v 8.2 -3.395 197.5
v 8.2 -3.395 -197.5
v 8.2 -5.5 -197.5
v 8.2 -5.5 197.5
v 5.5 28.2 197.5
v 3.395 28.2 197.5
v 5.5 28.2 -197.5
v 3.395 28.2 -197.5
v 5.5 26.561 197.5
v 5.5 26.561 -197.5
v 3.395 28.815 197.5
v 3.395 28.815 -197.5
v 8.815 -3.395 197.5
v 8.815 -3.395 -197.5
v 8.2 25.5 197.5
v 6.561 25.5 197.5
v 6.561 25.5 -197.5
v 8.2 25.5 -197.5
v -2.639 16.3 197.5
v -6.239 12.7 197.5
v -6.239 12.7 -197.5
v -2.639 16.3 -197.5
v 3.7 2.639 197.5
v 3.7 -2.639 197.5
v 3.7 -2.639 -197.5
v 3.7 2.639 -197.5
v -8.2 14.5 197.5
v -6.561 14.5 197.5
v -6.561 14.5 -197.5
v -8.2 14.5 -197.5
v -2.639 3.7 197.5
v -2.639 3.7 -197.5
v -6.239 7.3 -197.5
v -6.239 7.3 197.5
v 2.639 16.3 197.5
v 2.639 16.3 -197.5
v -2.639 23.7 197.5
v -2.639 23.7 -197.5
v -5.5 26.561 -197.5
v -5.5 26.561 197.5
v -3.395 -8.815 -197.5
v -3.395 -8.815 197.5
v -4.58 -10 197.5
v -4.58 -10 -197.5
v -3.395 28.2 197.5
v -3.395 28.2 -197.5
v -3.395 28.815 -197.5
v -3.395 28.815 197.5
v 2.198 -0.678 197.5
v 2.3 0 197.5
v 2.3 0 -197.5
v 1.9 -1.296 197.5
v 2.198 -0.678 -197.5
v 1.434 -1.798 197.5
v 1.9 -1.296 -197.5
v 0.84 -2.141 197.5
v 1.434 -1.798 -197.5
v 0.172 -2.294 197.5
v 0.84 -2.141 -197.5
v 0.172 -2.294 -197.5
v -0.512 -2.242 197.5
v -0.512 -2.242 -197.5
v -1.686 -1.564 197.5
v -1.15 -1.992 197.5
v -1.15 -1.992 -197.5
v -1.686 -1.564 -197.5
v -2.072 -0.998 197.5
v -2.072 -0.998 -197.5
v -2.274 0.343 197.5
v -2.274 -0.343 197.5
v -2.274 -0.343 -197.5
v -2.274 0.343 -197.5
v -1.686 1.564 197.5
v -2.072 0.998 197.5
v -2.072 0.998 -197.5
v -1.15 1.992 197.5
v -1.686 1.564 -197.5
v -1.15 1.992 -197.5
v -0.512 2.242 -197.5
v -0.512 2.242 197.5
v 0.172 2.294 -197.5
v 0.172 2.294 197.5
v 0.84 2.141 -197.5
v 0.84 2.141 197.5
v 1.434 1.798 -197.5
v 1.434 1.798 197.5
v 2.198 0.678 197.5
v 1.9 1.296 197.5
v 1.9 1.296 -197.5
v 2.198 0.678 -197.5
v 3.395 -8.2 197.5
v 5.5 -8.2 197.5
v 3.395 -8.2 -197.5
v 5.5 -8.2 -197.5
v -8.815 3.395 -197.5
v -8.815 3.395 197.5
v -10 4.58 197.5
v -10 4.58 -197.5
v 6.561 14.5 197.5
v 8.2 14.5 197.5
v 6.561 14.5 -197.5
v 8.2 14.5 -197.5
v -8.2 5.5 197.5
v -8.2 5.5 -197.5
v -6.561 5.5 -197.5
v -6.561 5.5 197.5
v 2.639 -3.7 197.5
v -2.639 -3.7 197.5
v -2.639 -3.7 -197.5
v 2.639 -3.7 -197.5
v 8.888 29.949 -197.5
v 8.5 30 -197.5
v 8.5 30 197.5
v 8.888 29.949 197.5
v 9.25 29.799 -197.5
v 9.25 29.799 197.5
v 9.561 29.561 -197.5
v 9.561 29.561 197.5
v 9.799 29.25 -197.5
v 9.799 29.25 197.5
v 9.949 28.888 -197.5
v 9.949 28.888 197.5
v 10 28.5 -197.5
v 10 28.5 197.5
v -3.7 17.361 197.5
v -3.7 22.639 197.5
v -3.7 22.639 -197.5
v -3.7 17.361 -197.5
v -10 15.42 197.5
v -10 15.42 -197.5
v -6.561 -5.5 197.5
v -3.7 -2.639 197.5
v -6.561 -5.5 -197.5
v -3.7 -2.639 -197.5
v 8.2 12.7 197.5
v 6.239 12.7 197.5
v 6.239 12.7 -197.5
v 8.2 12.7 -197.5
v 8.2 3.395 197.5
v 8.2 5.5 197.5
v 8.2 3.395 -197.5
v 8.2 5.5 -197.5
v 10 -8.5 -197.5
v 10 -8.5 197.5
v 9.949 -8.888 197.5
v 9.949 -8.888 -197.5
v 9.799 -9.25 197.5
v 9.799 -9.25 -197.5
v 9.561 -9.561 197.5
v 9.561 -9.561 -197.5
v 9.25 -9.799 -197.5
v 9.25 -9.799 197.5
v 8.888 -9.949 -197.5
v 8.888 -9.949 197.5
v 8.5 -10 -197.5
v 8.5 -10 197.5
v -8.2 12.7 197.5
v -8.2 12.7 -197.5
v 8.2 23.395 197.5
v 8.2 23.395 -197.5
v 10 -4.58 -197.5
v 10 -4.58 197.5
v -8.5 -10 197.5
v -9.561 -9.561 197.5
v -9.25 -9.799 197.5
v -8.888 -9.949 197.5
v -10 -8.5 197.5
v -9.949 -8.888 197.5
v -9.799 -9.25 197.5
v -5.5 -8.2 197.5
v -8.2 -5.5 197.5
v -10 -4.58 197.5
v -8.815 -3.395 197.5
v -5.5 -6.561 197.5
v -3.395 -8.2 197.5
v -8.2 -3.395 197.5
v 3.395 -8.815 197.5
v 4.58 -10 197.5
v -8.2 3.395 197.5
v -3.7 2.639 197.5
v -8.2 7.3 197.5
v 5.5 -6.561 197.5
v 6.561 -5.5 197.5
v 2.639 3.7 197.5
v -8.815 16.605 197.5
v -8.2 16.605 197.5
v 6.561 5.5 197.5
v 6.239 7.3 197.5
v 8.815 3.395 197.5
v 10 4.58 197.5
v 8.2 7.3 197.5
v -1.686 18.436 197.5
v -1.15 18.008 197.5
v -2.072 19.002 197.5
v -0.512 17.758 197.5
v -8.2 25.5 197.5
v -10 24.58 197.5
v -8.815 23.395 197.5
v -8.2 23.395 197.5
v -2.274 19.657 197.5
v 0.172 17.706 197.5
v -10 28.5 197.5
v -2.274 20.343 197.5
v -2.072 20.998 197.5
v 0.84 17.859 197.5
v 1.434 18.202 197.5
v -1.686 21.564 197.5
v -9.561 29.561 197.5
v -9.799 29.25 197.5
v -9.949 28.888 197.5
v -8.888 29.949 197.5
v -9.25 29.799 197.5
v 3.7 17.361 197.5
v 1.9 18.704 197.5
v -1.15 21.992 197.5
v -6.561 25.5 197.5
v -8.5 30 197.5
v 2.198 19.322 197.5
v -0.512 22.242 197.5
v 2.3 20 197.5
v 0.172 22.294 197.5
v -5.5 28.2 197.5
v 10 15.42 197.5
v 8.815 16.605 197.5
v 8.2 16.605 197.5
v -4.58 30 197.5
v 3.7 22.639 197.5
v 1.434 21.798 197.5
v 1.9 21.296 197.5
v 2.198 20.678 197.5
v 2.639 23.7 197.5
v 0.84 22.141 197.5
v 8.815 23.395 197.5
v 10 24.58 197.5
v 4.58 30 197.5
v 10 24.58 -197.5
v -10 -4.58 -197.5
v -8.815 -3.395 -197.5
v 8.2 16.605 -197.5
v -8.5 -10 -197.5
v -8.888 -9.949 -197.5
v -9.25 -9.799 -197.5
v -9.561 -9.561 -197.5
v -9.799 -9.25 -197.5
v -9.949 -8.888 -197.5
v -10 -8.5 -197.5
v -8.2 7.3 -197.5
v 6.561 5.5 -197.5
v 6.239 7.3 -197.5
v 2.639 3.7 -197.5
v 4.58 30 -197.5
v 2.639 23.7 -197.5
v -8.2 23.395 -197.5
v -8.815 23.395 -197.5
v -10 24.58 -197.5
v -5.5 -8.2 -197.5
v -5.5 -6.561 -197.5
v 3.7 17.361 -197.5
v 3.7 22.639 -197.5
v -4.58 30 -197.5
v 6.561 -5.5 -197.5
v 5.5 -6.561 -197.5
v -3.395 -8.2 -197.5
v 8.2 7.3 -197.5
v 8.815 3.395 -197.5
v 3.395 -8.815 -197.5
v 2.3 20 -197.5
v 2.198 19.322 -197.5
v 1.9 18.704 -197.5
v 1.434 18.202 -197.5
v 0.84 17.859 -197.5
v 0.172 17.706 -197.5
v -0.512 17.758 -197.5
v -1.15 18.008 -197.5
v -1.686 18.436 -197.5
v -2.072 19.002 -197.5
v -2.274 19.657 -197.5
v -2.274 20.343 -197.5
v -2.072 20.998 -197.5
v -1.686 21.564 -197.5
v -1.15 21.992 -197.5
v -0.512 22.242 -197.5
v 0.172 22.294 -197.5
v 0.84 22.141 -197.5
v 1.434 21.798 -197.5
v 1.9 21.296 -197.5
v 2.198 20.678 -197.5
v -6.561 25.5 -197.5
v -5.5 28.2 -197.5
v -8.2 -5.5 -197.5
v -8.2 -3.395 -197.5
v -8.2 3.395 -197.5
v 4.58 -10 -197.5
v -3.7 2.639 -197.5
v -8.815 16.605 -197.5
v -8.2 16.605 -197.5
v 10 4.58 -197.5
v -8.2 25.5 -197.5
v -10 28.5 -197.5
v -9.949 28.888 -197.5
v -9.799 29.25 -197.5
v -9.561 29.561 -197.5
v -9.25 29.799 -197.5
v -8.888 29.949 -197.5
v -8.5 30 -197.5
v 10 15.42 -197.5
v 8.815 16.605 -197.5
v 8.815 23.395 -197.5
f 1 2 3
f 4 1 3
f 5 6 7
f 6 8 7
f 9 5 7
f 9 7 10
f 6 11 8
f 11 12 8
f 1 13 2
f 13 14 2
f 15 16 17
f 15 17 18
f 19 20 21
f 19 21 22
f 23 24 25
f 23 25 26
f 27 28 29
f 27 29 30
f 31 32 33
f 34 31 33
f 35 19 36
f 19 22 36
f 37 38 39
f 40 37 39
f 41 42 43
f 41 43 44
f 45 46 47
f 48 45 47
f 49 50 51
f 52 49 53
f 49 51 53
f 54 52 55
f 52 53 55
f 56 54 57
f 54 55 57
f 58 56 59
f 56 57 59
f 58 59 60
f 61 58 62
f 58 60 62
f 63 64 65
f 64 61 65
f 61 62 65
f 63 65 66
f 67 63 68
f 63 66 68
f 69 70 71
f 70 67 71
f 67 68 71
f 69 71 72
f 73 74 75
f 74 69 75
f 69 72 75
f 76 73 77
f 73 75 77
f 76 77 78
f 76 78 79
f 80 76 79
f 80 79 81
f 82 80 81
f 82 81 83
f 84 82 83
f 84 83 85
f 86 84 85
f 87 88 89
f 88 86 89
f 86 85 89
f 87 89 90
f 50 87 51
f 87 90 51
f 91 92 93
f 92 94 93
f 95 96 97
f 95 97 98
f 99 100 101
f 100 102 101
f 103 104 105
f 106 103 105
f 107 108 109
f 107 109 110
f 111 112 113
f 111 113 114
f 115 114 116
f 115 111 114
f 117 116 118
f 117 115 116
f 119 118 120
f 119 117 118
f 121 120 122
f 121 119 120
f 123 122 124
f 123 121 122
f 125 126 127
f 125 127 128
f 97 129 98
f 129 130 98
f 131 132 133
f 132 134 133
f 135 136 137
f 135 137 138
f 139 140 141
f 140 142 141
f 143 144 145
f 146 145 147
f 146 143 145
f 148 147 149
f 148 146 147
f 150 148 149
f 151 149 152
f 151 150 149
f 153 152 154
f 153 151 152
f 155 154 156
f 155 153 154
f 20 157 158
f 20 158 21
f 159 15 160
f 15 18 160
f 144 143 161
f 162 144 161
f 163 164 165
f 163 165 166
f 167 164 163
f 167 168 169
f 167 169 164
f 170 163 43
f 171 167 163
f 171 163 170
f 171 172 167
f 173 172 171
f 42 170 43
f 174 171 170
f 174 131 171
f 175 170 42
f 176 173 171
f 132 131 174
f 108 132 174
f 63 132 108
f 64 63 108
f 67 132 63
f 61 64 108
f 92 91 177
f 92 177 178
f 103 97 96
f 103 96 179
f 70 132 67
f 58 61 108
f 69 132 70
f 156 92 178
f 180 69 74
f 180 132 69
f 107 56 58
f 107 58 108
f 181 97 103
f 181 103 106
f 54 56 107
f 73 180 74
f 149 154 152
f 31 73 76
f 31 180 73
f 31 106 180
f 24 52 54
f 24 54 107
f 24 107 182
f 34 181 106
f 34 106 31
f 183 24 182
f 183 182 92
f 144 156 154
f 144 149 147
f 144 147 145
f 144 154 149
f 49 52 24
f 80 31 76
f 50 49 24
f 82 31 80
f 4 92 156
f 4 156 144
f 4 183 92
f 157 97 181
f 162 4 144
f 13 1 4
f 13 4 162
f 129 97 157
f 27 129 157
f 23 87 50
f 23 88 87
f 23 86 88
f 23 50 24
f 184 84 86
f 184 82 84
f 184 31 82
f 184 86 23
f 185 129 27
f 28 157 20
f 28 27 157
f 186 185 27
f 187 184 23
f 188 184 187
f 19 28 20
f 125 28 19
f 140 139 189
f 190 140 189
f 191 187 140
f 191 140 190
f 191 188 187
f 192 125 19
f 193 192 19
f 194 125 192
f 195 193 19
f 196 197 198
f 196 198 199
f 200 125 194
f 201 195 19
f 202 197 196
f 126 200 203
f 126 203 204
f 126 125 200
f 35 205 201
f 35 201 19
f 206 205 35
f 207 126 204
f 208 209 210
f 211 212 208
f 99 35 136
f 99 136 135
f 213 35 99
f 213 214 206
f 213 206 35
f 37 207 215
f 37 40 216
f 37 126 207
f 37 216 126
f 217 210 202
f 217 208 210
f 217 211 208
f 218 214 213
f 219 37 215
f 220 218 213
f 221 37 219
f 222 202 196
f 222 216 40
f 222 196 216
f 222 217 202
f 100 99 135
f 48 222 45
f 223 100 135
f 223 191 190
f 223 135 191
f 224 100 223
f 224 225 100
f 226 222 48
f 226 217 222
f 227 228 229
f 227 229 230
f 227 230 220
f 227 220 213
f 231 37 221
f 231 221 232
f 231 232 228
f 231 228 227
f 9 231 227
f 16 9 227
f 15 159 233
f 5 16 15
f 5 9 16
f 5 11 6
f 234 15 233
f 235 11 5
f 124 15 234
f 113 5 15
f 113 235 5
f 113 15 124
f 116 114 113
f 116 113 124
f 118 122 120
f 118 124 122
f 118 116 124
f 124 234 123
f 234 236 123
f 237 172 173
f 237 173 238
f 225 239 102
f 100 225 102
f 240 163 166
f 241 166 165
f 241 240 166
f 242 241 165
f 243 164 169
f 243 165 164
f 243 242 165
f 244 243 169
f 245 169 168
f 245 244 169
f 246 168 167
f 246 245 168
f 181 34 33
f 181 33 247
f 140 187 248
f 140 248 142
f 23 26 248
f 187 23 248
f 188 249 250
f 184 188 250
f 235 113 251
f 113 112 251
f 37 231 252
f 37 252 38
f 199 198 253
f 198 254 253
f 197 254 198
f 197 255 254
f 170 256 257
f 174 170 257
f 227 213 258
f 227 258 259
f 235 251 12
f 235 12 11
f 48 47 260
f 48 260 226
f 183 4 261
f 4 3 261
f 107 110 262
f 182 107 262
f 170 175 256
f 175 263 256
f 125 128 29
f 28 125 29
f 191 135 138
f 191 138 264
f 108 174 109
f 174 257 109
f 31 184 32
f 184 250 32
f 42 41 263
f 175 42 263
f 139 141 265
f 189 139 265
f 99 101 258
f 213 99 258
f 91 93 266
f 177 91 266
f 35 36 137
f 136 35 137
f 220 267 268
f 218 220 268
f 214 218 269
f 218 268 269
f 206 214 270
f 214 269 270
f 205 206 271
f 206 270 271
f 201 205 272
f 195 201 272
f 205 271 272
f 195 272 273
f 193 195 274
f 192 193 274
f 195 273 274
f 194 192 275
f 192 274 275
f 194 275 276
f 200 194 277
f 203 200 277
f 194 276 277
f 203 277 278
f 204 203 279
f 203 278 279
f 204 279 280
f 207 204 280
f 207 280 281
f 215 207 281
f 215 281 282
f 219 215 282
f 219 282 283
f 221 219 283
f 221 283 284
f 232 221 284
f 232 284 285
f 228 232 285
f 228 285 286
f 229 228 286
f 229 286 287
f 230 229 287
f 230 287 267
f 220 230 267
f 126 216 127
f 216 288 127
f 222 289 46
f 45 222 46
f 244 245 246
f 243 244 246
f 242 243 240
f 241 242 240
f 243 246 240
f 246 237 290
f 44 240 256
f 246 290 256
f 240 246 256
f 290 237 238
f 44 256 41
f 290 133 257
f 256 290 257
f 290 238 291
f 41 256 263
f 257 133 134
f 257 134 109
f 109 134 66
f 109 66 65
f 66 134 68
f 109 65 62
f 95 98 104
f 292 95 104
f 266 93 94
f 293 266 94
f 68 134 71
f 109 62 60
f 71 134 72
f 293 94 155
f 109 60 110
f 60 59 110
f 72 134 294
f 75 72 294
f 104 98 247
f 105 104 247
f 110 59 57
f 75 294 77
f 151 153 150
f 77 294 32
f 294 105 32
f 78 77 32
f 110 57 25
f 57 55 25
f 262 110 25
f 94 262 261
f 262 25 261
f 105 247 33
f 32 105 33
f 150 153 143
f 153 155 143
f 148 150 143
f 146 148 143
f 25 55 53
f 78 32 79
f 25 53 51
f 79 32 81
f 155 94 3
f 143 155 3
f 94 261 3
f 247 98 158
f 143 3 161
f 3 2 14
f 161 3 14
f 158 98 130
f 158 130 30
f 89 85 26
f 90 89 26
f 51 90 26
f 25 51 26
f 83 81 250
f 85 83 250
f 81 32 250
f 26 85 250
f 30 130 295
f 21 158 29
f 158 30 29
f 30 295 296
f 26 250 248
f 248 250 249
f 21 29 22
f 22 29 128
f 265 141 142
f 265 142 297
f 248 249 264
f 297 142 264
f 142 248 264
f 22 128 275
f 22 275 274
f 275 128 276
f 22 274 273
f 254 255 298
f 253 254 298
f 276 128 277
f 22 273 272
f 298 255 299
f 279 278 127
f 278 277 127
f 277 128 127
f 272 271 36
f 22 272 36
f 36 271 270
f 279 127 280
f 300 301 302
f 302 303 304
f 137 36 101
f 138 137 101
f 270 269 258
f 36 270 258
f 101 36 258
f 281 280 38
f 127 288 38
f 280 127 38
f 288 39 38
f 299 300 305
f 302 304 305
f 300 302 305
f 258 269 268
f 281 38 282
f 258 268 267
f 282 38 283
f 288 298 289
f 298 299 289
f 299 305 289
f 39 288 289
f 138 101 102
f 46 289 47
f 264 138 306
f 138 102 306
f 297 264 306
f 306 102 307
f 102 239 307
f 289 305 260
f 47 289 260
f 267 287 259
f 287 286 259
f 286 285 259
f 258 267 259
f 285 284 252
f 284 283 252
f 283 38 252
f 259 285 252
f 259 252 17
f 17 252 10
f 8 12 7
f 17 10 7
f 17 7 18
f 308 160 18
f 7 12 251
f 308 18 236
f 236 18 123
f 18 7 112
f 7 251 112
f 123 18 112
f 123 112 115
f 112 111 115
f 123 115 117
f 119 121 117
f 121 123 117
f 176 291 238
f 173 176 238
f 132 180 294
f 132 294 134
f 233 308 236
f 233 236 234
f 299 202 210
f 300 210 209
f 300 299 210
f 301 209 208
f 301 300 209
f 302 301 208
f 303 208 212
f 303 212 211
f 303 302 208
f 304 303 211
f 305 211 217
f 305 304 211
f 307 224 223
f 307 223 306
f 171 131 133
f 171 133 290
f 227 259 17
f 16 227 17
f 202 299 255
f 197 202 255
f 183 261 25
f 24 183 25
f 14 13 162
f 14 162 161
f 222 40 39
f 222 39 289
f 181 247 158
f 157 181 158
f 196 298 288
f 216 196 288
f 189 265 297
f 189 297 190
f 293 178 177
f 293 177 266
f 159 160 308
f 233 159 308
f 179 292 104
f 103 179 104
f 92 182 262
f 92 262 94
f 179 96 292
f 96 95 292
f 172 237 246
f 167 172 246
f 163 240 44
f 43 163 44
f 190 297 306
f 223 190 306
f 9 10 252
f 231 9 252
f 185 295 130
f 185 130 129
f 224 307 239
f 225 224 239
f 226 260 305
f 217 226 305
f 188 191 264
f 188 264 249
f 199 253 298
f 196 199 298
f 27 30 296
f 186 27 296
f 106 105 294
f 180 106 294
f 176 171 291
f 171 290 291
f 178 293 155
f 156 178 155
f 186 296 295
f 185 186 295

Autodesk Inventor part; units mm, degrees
ref_plane "YZ Plane" through (0, 0, 0) normal (1, 0, 0) x (0, 1, 0)
ref_plane "XZ Plane" through (0, 0, 0) normal (0, 1, 0) x (-1, 0, 0)
sketch "Sketch1" plane through (0, 0, 0) normal (0, 0, 1) x (1, 0, 0)
  line L0 (0, 3.7) -> (-2.6393, 3.7)
  line L1 (-2.6393, 3.7) -> (-5.5, 6.5607)
  line L2 (-5.5, 6.5607) -> (-5.5, 8.2)
  line L3 (-5.5, 8.2) -> (-3.395, 8.2)
  line L4 (-3.395, 8.2) -> (-3.395, 10)
  line L5 (-3.395, 10) -> (-10, 10)
  line L6 (-10, 10) -> (-10, 3.395)
  line L7 (-10, 3.395) -> (-8.2, 3.395)
  line L8 (-8.2, 3.395) -> (-8.2, 5.5)
  line L9 (-8.2, 5.5) -> (-6.5607, 5.5)
  line L10 (-6.5607, 5.5) -> (-3.7, 2.6393)
  line L11 (-3.7, 2.6393) -> (-3.7, 0)
  line L12 (0, 0) -> (-10, 10) construction
  circle A0 centre (0, 0) radius 2.3
  line L13 (-22.6601, 0) -> (65.9605, 0) projected
  line L14 (-3.7, 0) -> (0, 0)
  line L15 (0, 0) -> (0, 3.7)
  line L16 (11.2521, 18.9743) -> (53.3004, 18.9743) construction
  line L17 (53.3004, 18.9743) -> (53.3004, -5.624) construction
  line L18 (53.3004, -5.624) -> (11.2521, -5.624) construction
  line L19 (11.2521, -5.624) -> (11.2521, 18.9743) construction
  point P0 (-2.3, 0)
  point P1 (0, 2.3)
  dimension "d0" = 1.5
  dimension "d6" = 6.3
  dimension "d9" = 4.6
  dimension "d18" = 135
  dimension "d22" = 20
  dimension "d34" = 11
  dimension "d35" = 6.79
  dimension "d36" = 1.8
extrude "Extrusion1" add sketch "Sketch1" along normal mid plane 395 contours L15 A0 L13 L11 L10 L9 L8 L7 L6 L5 L4 L3 L2 L1 L0
pattern_circular "Circular Pattern1" count 4 over 360 about axis through (0, 0, -10) along (0, 0, 1) of "Extrusion1"
chamfer "Chamfer1" distance 1.185 angle 45 8 edges at (-3.395, 10, 0) (3.395, 10, 0) (10, 3.395, 0) (10, -3.395, 0) (3.395, -10, 0) (-3.395, -10, 0) (-10, -3.395, 0) (-10, 3.395, 0)
ref_plane "Work Plane1" through (4.58, 10, 197.5) normal (0, 1, 0) x (1, 0, 0)
mirror "Mirror1" about plane through (4.58, 10, 197.5) normal (0, 1, 0)
sketch "Sketch2" plane through (0, 0, 197.5) normal (0, 0, 1) x (1, 0, 0)
  line L0 (-10, 4.58) -> (-10, 15.42) projected
  line L1 (-8.815, 3.395) -> (-10, 4.58) projected
  line L2 (-8.815, 3.395) -> (-8.2, 3.395) projected
  line L3 (-8.2, 3.395) -> (-8.2, 5.5) projected
  line L4 (-8.2, 5.5) -> (-6.5607, 5.5) projected
  line L5 (-6.5607, 5.5) -> (-3.7, 2.6393) projected
  line L6 (-3.7, -2.6393) -> (-6.5607, -5.5) projected
  line L7 (-6.5607, -5.5) -> (-8.2, -5.5) projected
  line L8 (-8.2, -5.5) -> (-8.2, -3.395) projected
  line L9 (-8.2, -3.395) -> (-8.815, -3.395) projected
  line L10 (-10, -4.58) -> (-8.815, -3.395) projected
  line L11 (-10, -4.58) -> (-10, -10) projected
  line L12 (-10, -10) -> (-4.58, -10) projected
  line L13 (-3.395, -8.815) -> (-4.58, -10) projected
  line L14 (-3.395, -8.815) -> (-3.395, -8.2) projected
  line L15 (-3.395, -8.2) -> (-5.5, -8.2) projected
  line L16 (-5.5, -8.2) -> (-5.5, -6.5607) projected
  line L17 (-5.5, -6.5607) -> (-2.6393, -3.7) projected
  line L18 (2.6393, -3.7) -> (5.5, -6.5607) projected
  line L19 (5.5, -6.5607) -> (5.5, -8.2) projected
  line L20 (5.5, -8.2) -> (3.395, -8.2) projected
  line L21 (3.395, -8.2) -> (3.395, -8.815) projected
  line L22 (4.58, -10) -> (3.395, -8.815) projected
  line L23 (4.58, -10) -> (10, -10) projected
  line L24 (10, -10) -> (10, -4.58) projected
  line L25 (8.815, -3.395) -> (10, -4.58) projected
  line L26 (8.815, -3.395) -> (8.2, -3.395) projected
  line L27 (8.2, -3.395) -> (8.2, -5.5) projected
  line L28 (8.2, -5.5) -> (6.5607, -5.5) projected
  line L29 (6.5607, -5.5) -> (3.7, -2.6393) projected
  line L30 (3.7, 2.6393) -> (6.5607, 5.5) projected
  line L31 (6.5607, 5.5) -> (8.2, 5.5) projected
  line L32 (8.2, 5.5) -> (8.2, 3.395) projected
  line L33 (8.2, 3.395) -> (8.815, 3.395) projected
  line L34 (10, 4.58) -> (8.815, 3.395) projected
  line L35 (10, 4.58) -> (10, 15.42) projected
  line L36 (10, 15.42) -> (8.815, 16.605) projected
  line L37 (8.2, 16.605) -> (8.815, 16.605) projected
  line L38 (8.2, 14.5) -> (8.2, 16.605) projected
  line L39 (6.5607, 14.5) -> (8.2, 14.5) projected
  line L40 (3.7, 17.3607) -> (6.5607, 14.5) projected
  line L41 (6.5607, 25.5) -> (3.7, 22.6393) projected
  line L42 (8.2, 25.5) -> (6.5607, 25.5) projected
  line L43 (8.2, 23.395) -> (8.2, 25.5) projected
  line L44 (8.815, 23.395) -> (8.2, 23.395) projected
  line L45 (8.815, 23.395) -> (10, 24.58) projected
  line L46 (10, 30) -> (10, 24.58) projected
  line L47 (4.58, 30) -> (10, 30) projected
  line L48 (4.58, 30) -> (3.395, 28.815) projected
  line L49 (3.395, 28.2) -> (3.395, 28.815) projected
  line L50 (5.5, 28.2) -> (3.395, 28.2) projected
  line L51 (5.5, 26.5607) -> (5.5, 28.2) projected
  line L52 (2.6393, 23.7) -> (5.5, 26.5607) projected
  line L53 (-5.5, 26.5607) -> (-2.6393, 23.7) projected
  line L54 (-5.5, 28.2) -> (-5.5, 26.5607) projected
  line L55 (-3.395, 28.2) -> (-5.5, 28.2) projected
  line L56 (-3.395, 28.815) -> (-3.395, 28.2) projected
  line L57 (-3.395, 28.815) -> (-4.58, 30) projected
  line L58 (-10, 30) -> (-4.58, 30) projected
  line L59 (-10, 24.58) -> (-10, 30) projected
  line L60 (-10, 24.58) -> (-8.815, 23.395) projected
  line L61 (-8.2, 23.395) -> (-8.815, 23.395) projected
  line L62 (-8.2, 25.5) -> (-8.2, 23.395) projected
  line L63 (-6.5607, 25.5) -> (-8.2, 25.5) projected
  line L64 (-3.7, 22.6393) -> (-6.5607, 25.5) projected
  line L65 (-6.5607, 14.5) -> (-3.7, 17.3607) projected
  line L66 (-8.2, 14.5) -> (-6.5607, 14.5) projected
  line L67 (-8.2, 16.605) -> (-8.2, 14.5) projected
  line L68 (-8.815, 16.605) -> (-8.2, 16.605) projected
  line L69 (-8.815, 16.605) -> (-10, 15.42) projected
  circle A0 centre (0, 20) radius 2.3 projected
  line L70 (-4.58, 10) -> (-3.395, 11.185) projected
  line L71 (-3.395, 11.8) -> (-3.395, 11.185) projected
  line L72 (-5.5, 11.8) -> (-3.395, 11.8) projected
  line L73 (-5.5, 13.4393) -> (-5.5, 11.8) projected
  line L74 (-2.6393, 16.3) -> (-5.5, 13.4393) projected
  line L75 (5.5, 13.4393) -> (2.6393, 16.3) projected
  line L76 (5.5, 11.8) -> (5.5, 13.4393) projected
  line L77 (3.395, 11.8) -> (5.5, 11.8) projected
  line L78 (3.395, 11.185) -> (3.395, 11.8) projected
  line L79 (3.395, 11.185) -> (4.58, 10) projected
  line L80 (3.395, 8.815) -> (4.58, 10) projected
  line L81 (3.395, 8.815) -> (3.395, 8.2) projected
  line L82 (3.395, 8.2) -> (5.5, 8.2) projected
  line L83 (5.5, 8.2) -> (5.5, 6.5607) projected
  line L84 (5.5, 6.5607) -> (2.6393, 3.7) projected
  line L85 (-2.6393, 3.7) -> (-5.5, 6.5607) projected
  line L86 (-5.5, 6.5607) -> (-5.5, 8.2) projected
  line L87 (-5.5, 8.2) -> (-3.395, 8.2) projected
  line L88 (-3.395, 8.2) -> (-3.395, 8.815) projected
  line L89 (-4.58, 10) -> (-3.395, 8.815) projected
  circle A1 centre (0, 0) radius 2.3 projected
  line L90 (-5.5, 8.2) -> (-5.5, 6.5607) projected
  line L91 (-5.5, 6.5607) -> (-6.2393, 7.3)
  line L92 (-5.5, 6.5607) -> (-2.6393, 3.7) projected
  line L93 (-6.2393, 7.3) -> (-8.2, 7.3)
  line L94 (-8.2, 7.3) -> (-8.2, 12.7)
  line L95 (-8.2, 12.7) -> (-6.2393, 12.7)
  line L96 (-6.2393, 12.7) -> (-5.5, 13.4393)
  line L97 (-2.6393, 16.3) -> (-5.5, 13.4393) projected
  line L98 (-8.2, 16.605) -> (-8.2, 14.5) projected
  line L99 (-3.7, 2.6393) -> (-3.7, -2.6393) projected
  line L100 (-2.6393, -3.7) -> (2.6393, -3.7) projected
  line L101 (3.7, -2.6393) -> (3.7, 2.6393) projected
  line L102 (3.7, 22.6393) -> (3.7, 17.3607) projected
  line L103 (-2.6393, 23.7) -> (2.6393, 23.7) projected
  line L104 (-3.7, 17.3607) -> (-3.7, 22.6393) projected
  line L105 (2.6393, 16.3) -> (-2.6393, 16.3) projected
  line L106 (2.6393, 3.7) -> (-2.6393, 3.7) projected
  dimension "d42" = 1.8
extrude "Extrusion2" cut sketch "Sketch2" against normal through all contours L89 L88 L87 L86 L91 L93 L94 L95 L96 L73 L72 L71 L70
fillet "Fillet2" radius 1.5 4 edges at (-10, 30, 0) (10, 30, 0) (10, -10, 0) (-10, -10, 0)
mirror "Mirror2" about plane through (0, 0, 0) normal (1, 0, 0) of "Extrusion2"
equation "\"d24\" = WorkspaceLength"
equation "\"GridProcutClearance\" = 3"
equation "\"GridBorderThickness\" = 5"
equation "\"GridBorderFillets\" = 7"
equation "\"GridTotalSize\" = 63"
equation "\"BaseTotalWidth\" = 412"
equation "\"BaseTotalLength\" = 624"
equation "\"DistanceBetweenGrid\" = 5"
equation "\"WorkspaceLength\" = 395"
equation "\"WorkspaceWidth\" = 332"
equation "\"AxesBaseFillet\" = 15"
equation "\"Zaxis\" = 127"
properties part number "2040aluminum_extrusion_black" material "Aluminum 6061"
